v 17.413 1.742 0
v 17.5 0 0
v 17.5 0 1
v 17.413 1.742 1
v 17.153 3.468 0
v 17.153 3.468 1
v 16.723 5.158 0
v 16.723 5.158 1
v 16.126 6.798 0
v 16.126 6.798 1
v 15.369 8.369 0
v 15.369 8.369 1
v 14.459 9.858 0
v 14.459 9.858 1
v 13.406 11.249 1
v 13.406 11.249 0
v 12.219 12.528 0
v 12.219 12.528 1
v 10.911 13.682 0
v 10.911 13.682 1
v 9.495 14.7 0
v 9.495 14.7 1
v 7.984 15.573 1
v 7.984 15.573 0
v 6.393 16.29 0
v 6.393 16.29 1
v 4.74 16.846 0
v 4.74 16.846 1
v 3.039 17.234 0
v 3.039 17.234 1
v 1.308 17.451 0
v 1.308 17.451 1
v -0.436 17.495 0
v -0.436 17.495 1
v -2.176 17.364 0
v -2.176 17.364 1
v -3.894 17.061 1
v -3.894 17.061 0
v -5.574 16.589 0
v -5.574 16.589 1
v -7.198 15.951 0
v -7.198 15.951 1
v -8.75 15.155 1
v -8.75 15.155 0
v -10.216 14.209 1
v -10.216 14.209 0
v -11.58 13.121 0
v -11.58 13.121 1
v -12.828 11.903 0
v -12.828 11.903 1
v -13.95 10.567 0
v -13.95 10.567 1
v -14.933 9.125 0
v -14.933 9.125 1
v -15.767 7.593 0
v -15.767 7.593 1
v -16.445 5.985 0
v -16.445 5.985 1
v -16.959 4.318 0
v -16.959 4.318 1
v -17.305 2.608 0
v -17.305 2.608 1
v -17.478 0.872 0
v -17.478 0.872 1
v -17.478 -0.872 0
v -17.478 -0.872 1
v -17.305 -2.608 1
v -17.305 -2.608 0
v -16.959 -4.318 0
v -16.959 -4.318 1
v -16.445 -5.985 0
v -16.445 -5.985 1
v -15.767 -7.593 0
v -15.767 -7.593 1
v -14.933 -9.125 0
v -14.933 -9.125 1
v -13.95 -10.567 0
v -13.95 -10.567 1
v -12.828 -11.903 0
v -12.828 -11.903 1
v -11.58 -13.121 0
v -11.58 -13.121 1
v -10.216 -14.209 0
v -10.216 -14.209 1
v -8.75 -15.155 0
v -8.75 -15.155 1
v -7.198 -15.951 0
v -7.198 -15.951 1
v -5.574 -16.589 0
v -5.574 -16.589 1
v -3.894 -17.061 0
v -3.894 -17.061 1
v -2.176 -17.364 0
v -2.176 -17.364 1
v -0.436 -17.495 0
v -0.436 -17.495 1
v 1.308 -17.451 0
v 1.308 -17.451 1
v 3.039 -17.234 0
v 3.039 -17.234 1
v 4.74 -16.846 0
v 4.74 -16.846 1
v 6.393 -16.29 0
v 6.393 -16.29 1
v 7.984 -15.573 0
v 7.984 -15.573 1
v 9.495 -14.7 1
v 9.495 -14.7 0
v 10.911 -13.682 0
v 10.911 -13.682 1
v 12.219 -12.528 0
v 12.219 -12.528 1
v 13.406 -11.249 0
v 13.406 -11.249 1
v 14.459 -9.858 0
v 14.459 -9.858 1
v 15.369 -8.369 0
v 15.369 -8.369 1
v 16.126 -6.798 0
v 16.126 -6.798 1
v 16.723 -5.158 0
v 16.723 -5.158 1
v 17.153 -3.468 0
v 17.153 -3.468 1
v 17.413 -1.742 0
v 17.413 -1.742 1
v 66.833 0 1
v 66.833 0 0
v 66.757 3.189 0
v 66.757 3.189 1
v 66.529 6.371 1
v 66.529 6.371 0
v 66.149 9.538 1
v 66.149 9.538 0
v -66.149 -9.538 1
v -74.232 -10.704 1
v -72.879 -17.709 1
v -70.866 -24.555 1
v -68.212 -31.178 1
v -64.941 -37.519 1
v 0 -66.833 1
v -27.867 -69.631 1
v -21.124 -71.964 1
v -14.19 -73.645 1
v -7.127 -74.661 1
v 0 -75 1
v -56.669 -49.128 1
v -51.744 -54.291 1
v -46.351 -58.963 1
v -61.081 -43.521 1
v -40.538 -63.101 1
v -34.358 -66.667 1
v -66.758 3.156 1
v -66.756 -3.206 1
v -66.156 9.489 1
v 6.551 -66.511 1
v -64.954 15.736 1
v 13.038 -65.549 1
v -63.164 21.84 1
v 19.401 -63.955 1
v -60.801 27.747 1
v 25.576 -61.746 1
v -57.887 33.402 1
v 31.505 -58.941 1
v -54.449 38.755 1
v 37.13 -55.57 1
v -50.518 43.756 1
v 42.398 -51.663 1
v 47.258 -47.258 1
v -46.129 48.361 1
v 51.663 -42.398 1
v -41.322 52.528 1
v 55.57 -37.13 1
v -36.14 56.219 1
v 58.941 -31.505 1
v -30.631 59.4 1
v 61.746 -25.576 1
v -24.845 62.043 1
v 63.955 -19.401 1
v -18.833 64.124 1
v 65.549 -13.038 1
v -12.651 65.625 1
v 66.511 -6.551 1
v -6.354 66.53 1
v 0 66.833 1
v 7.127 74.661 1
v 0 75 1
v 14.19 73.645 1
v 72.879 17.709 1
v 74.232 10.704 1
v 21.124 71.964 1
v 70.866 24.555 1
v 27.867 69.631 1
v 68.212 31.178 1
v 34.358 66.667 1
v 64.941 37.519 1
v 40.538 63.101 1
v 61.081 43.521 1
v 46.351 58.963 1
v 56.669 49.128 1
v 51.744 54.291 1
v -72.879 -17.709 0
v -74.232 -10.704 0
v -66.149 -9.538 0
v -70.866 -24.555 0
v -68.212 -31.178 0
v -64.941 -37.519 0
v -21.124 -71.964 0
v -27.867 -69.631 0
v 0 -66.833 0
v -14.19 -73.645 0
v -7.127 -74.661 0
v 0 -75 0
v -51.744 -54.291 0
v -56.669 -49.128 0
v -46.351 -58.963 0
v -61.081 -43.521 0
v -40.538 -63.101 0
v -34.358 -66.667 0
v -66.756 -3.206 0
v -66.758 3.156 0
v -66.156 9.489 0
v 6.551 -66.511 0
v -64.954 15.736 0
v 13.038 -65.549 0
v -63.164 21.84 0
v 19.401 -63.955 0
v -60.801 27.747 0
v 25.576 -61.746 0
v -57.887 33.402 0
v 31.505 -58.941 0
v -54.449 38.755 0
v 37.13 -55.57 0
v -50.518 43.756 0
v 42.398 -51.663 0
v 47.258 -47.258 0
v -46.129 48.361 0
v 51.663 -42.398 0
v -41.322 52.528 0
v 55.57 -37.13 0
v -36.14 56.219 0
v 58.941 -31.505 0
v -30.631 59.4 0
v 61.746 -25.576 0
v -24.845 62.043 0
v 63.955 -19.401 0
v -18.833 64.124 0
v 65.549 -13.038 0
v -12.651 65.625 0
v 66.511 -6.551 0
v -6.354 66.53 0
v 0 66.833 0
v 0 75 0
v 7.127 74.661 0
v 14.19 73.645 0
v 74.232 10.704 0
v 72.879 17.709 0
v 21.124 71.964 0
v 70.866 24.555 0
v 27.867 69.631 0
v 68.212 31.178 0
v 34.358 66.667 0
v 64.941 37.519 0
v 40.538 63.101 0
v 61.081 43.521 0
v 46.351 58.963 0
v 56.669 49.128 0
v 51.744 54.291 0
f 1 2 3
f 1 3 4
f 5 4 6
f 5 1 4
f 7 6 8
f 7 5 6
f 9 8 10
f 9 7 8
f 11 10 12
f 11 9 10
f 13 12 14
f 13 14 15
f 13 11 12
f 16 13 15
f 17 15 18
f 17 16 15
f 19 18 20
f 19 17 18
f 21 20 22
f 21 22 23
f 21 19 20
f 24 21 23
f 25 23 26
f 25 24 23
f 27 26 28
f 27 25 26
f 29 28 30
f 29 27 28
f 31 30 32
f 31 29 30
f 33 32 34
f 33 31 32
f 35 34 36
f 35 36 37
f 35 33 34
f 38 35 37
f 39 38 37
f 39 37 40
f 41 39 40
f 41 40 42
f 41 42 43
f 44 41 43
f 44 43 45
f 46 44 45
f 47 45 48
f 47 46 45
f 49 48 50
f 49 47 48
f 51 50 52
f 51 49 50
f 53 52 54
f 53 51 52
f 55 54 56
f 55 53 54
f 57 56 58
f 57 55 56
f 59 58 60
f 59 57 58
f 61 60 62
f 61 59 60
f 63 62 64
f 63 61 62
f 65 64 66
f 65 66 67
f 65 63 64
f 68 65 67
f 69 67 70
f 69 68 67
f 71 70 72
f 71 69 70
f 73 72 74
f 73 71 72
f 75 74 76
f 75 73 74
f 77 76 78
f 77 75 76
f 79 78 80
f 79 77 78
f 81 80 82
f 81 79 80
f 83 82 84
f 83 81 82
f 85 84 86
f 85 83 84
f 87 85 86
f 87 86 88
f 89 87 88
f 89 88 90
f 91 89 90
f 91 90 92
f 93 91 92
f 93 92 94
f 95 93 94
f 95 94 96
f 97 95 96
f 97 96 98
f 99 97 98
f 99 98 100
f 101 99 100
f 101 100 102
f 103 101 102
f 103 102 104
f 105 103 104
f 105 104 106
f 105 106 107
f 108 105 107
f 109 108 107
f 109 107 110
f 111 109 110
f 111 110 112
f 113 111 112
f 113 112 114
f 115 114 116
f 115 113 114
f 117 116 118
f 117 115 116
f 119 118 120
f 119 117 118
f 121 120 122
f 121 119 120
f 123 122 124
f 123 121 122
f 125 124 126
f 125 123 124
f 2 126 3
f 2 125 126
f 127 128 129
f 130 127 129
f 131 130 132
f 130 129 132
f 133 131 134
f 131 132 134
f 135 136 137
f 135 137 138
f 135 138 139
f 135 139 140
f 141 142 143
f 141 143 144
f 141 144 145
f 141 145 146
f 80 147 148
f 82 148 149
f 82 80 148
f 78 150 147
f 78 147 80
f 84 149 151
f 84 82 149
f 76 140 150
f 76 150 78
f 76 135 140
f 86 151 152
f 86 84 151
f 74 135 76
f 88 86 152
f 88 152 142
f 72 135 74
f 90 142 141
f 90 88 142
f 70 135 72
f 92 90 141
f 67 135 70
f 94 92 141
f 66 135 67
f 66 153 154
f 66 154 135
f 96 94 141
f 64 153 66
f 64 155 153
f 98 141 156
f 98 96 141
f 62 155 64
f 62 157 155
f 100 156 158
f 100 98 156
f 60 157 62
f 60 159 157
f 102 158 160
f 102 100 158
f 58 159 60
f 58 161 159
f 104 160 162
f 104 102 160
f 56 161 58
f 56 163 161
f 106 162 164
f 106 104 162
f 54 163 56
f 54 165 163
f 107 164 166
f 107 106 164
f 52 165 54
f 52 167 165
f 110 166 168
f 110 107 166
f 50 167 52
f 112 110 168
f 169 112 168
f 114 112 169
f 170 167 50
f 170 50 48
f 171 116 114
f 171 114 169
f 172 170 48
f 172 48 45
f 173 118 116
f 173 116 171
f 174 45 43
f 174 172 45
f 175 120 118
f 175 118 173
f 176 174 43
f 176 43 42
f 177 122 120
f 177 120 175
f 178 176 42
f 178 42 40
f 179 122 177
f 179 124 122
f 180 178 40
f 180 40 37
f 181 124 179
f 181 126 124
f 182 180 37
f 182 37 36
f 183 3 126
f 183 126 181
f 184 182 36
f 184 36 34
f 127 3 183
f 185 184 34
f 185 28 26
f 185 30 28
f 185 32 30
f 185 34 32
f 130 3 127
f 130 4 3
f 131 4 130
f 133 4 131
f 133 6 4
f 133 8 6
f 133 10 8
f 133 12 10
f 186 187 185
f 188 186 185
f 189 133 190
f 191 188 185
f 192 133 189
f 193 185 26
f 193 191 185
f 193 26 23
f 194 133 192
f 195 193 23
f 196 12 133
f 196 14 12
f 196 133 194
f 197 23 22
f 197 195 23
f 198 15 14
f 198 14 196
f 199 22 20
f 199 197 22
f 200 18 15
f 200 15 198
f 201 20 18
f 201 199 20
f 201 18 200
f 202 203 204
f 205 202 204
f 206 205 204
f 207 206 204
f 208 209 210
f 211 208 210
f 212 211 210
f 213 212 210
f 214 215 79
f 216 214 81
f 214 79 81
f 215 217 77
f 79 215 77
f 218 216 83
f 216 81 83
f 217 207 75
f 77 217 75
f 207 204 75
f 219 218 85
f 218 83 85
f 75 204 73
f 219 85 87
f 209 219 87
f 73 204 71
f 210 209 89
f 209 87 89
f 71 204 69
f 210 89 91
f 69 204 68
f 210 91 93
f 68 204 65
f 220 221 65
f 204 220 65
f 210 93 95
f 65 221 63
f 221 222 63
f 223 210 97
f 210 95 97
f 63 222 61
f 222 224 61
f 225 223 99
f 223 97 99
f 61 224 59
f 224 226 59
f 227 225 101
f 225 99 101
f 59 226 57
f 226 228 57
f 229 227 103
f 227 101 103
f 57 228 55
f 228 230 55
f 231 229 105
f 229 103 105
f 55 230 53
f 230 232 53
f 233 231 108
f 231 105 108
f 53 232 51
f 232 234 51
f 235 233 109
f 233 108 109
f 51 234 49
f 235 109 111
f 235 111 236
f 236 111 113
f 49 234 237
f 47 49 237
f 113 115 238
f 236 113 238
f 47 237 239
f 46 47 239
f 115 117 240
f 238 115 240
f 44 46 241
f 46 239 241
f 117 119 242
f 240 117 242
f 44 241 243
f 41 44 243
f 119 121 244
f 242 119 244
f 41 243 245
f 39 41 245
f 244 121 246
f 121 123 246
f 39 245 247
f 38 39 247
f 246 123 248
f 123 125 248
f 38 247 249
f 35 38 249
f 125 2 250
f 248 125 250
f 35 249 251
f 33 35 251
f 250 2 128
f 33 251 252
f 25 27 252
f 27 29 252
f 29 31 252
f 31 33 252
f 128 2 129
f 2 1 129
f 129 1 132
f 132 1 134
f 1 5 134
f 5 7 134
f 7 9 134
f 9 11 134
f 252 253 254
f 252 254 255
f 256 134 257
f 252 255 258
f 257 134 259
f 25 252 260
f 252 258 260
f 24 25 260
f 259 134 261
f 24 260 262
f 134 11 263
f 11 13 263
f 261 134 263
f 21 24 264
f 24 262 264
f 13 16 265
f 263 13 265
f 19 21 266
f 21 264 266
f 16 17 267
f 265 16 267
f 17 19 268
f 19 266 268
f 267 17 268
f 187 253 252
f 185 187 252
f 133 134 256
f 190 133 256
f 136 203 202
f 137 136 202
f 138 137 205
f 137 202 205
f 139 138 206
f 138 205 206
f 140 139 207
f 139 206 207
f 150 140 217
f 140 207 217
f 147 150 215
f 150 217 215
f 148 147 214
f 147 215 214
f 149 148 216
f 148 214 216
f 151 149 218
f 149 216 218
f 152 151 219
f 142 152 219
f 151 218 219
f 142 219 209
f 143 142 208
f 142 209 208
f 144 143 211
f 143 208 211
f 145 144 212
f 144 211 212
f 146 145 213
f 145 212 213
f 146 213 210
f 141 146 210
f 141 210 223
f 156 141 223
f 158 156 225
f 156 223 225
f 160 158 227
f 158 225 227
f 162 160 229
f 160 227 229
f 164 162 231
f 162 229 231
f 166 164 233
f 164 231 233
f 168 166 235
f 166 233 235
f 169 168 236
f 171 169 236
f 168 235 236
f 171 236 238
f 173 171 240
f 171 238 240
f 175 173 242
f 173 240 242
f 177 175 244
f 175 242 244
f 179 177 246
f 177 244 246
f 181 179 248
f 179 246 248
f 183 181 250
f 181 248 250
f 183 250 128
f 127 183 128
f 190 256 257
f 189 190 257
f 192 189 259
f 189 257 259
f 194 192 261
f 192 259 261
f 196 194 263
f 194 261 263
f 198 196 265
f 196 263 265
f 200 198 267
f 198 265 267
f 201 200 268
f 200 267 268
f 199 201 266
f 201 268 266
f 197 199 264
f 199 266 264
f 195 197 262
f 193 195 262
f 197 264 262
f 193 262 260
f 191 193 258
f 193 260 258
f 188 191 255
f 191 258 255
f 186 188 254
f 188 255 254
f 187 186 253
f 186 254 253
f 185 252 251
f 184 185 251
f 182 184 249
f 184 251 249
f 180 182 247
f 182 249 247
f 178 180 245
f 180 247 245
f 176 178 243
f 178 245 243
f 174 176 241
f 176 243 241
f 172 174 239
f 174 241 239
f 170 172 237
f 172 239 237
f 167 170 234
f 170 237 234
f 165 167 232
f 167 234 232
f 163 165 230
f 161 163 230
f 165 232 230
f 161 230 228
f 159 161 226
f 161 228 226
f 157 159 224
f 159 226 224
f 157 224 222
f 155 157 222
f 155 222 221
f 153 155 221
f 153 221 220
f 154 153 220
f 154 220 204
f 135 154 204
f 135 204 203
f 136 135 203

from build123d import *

# Parameters (mm, degrees)
F0_R     = 17.5
F1_DEPTH = 1


with BuildPart() as f1:
    # F0 (on Top) → F1 (new body)
    with BuildSketch(Plane.XY):
        with BuildLine():
            ThreePointArc((-74.232287, -10.703622), (-49.103097, -56.691144), (0, -75))
            Line((0, -75), (0, -66.83293))
            ThreePointArc((0, -66.83293), (-43.756051, -50.517803), (-66.148816, -9.538059))
            Line((-66.148816, -9.538059), (-74.232287, -10.703622))
        make_face()
        with BuildLine():
            Line((66.148816, 9.538059), (74.232287, 10.703622))
            ThreePointArc((74.232287, 10.703622), (49.103097, 56.691144), (0, 75))
            Line((0, 75), (0, 66.83293))
            ThreePointArc((0, 66.83293), (43.756051, 50.517803), (66.148816, 9.538059))
        make_face()
        with BuildLine():
            ThreePointArc((66.83293, 0), (66.661682, 4.781281), (66.148816, 9.538059))
            ThreePointArc((66.148816, 9.538059), (43.756051, 50.517803), (0, 66.83293))
            ThreePointArc((0, 66.83293), (-50.517803, 43.756051), (-66.148816, -9.538059))
            ThreePointArc((-66.148816, -9.538059), (-43.756051, -50.517803), (0, -66.83293))
            ThreePointArc((0, -66.83293), (47.258018, -47.258018), (66.83293, 0))
        make_face()
        Circle(F0_R, mode=Mode.SUBTRACT)
    extrude(amount=F1_DEPTH)


solid = f1.part
